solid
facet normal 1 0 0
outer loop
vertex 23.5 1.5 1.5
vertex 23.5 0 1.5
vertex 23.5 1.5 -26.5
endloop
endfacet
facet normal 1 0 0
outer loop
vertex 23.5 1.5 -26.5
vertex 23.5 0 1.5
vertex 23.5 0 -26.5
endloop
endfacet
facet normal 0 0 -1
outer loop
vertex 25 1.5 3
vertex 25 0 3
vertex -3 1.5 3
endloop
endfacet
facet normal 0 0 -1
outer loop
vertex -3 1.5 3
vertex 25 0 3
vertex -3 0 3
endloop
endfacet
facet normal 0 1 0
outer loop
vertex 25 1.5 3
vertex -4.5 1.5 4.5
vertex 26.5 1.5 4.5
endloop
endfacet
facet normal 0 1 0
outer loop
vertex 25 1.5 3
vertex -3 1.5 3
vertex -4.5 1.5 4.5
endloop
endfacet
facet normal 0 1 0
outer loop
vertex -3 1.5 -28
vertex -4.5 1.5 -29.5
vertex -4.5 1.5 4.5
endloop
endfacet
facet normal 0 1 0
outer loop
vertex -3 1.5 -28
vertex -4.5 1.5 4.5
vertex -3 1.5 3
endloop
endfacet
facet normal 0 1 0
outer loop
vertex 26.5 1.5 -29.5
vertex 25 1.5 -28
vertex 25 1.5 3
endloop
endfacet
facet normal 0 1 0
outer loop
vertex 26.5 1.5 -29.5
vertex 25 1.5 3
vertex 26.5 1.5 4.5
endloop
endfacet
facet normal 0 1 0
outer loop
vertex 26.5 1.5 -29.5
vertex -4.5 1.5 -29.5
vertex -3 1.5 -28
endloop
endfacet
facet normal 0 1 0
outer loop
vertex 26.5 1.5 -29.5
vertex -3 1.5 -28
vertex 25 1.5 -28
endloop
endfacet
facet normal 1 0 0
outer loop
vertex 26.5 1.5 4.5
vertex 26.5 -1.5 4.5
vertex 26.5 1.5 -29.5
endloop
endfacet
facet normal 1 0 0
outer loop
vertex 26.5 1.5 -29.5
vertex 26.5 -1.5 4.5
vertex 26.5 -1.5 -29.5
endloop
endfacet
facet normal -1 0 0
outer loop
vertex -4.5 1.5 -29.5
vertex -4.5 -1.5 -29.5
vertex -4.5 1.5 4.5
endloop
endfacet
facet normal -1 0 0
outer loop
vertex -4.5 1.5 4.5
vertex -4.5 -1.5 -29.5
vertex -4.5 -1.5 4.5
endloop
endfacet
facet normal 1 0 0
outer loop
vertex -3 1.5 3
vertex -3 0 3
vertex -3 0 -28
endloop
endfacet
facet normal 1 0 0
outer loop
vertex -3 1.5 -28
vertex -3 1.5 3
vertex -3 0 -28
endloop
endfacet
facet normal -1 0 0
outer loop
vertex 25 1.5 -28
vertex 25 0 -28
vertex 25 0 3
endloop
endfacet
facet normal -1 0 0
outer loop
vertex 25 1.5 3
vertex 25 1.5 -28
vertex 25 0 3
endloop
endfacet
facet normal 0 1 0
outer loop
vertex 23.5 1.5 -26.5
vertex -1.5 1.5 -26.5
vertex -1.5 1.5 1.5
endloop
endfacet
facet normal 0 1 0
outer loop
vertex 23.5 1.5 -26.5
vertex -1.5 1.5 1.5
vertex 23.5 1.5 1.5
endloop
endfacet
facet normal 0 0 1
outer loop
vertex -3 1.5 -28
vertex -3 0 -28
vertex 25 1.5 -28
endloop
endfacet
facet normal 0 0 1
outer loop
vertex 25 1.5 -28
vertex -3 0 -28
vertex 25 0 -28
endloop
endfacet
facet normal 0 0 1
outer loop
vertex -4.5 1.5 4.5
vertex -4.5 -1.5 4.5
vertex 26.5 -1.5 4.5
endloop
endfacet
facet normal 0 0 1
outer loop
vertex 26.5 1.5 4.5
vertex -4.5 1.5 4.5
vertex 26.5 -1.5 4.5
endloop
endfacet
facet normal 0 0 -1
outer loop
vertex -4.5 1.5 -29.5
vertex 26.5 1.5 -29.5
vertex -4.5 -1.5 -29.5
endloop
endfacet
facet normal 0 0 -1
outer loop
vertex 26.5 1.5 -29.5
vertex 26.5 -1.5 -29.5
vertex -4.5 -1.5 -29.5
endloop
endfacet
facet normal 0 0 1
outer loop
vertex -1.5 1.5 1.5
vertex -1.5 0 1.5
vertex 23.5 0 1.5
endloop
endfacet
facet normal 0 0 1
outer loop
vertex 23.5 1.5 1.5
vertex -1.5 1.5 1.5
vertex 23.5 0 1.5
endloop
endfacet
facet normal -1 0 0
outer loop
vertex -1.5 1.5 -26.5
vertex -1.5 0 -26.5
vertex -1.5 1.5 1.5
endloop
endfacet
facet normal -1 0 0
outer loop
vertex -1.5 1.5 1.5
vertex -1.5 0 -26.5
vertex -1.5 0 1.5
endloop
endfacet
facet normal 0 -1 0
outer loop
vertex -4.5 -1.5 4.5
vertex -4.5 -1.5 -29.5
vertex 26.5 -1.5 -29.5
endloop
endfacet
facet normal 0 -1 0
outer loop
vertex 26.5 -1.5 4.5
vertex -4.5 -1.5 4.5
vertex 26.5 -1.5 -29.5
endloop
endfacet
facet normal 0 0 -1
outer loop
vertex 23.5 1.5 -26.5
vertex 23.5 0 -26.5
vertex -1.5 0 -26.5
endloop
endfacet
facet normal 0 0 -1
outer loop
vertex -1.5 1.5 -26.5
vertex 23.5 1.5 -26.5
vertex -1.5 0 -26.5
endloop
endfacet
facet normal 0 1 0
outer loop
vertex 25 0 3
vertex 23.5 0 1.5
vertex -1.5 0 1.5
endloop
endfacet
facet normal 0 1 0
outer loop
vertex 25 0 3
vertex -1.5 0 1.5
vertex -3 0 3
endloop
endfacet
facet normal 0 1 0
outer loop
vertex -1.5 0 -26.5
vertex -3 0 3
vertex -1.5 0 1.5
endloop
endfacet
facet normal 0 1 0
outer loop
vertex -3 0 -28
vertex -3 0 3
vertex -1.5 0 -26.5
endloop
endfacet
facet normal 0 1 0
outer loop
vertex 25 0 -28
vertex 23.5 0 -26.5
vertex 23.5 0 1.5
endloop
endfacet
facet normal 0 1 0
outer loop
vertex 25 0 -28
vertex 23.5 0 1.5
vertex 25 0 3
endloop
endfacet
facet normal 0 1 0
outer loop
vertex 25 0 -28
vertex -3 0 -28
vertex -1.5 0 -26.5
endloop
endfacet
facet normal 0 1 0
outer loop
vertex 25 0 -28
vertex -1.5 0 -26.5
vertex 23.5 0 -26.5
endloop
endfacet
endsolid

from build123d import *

# Parameters (mm, degrees)
SKETCH1_TURRETBODYPARENT_11_W   = 31
SKETCH1_TURRETBODYPARENT_11_H   = 34
BOSS_EXTRUDE1_DEPTH             = 1.5
SKETCH1_TURRETBODYPARENT_13_W   = 31
SKETCH1_TURRETBODYPARENT_13_H   = 34
SKETCH1_TURRETBODYPARENT_13_W_2 = 28
SKETCH1_TURRETBODYPARENT_13_H_2 = 31
SKETCH1_TURRETBODYPARENT_13_W_3 = 25
SKETCH1_TURRETBODYPARENT_13_H_3 = 28
BOSS_EXTRUDE2_DEPTH             = 1.5


with BuildPart() as part:
    # Sketch1-turretBodyParent<11> → Boss-Extrude1 (new body)
    with BuildSketch(Plane(origin=(0, 0, 0), x_dir=(1, 0, 0), z_dir=(0, 1, 0))):
        with Locations((11, 12.5)):
            Rectangle(SKETCH1_TURRETBODYPARENT_11_W, SKETCH1_TURRETBODYPARENT_11_H)
    extrude(amount=-BOSS_EXTRUDE1_DEPTH)

    # Sketch1-turretBodyParent<13> → Boss-Extrude2 (add)
    # profile 1 of 2: a face of its own
    with BuildSketch(Plane(origin=(0, 0, 0), x_dir=(1, 0, 0), z_dir=(0, 1, 0))):
        with Locations((11, 12.5)):
            Rectangle(SKETCH1_TURRETBODYPARENT_13_W, SKETCH1_TURRETBODYPARENT_13_H)
        with Locations((11, 12.5)):
            Rectangle(SKETCH1_TURRETBODYPARENT_13_W_2, SKETCH1_TURRETBODYPARENT_13_H_2, mode=Mode.SUBTRACT)
    # profile 2 of 2: a face of its own
    with BuildSketch(Plane(origin=(0, 0, 0), x_dir=(1, 0, 0), z_dir=(0, 1, 0))):
        with Locations((11, 12.5)):
            Rectangle(SKETCH1_TURRETBODYPARENT_13_W_3, SKETCH1_TURRETBODYPARENT_13_H_3)
    extrude(amount=BOSS_EXTRUDE2_DEPTH)


solid = part.part
